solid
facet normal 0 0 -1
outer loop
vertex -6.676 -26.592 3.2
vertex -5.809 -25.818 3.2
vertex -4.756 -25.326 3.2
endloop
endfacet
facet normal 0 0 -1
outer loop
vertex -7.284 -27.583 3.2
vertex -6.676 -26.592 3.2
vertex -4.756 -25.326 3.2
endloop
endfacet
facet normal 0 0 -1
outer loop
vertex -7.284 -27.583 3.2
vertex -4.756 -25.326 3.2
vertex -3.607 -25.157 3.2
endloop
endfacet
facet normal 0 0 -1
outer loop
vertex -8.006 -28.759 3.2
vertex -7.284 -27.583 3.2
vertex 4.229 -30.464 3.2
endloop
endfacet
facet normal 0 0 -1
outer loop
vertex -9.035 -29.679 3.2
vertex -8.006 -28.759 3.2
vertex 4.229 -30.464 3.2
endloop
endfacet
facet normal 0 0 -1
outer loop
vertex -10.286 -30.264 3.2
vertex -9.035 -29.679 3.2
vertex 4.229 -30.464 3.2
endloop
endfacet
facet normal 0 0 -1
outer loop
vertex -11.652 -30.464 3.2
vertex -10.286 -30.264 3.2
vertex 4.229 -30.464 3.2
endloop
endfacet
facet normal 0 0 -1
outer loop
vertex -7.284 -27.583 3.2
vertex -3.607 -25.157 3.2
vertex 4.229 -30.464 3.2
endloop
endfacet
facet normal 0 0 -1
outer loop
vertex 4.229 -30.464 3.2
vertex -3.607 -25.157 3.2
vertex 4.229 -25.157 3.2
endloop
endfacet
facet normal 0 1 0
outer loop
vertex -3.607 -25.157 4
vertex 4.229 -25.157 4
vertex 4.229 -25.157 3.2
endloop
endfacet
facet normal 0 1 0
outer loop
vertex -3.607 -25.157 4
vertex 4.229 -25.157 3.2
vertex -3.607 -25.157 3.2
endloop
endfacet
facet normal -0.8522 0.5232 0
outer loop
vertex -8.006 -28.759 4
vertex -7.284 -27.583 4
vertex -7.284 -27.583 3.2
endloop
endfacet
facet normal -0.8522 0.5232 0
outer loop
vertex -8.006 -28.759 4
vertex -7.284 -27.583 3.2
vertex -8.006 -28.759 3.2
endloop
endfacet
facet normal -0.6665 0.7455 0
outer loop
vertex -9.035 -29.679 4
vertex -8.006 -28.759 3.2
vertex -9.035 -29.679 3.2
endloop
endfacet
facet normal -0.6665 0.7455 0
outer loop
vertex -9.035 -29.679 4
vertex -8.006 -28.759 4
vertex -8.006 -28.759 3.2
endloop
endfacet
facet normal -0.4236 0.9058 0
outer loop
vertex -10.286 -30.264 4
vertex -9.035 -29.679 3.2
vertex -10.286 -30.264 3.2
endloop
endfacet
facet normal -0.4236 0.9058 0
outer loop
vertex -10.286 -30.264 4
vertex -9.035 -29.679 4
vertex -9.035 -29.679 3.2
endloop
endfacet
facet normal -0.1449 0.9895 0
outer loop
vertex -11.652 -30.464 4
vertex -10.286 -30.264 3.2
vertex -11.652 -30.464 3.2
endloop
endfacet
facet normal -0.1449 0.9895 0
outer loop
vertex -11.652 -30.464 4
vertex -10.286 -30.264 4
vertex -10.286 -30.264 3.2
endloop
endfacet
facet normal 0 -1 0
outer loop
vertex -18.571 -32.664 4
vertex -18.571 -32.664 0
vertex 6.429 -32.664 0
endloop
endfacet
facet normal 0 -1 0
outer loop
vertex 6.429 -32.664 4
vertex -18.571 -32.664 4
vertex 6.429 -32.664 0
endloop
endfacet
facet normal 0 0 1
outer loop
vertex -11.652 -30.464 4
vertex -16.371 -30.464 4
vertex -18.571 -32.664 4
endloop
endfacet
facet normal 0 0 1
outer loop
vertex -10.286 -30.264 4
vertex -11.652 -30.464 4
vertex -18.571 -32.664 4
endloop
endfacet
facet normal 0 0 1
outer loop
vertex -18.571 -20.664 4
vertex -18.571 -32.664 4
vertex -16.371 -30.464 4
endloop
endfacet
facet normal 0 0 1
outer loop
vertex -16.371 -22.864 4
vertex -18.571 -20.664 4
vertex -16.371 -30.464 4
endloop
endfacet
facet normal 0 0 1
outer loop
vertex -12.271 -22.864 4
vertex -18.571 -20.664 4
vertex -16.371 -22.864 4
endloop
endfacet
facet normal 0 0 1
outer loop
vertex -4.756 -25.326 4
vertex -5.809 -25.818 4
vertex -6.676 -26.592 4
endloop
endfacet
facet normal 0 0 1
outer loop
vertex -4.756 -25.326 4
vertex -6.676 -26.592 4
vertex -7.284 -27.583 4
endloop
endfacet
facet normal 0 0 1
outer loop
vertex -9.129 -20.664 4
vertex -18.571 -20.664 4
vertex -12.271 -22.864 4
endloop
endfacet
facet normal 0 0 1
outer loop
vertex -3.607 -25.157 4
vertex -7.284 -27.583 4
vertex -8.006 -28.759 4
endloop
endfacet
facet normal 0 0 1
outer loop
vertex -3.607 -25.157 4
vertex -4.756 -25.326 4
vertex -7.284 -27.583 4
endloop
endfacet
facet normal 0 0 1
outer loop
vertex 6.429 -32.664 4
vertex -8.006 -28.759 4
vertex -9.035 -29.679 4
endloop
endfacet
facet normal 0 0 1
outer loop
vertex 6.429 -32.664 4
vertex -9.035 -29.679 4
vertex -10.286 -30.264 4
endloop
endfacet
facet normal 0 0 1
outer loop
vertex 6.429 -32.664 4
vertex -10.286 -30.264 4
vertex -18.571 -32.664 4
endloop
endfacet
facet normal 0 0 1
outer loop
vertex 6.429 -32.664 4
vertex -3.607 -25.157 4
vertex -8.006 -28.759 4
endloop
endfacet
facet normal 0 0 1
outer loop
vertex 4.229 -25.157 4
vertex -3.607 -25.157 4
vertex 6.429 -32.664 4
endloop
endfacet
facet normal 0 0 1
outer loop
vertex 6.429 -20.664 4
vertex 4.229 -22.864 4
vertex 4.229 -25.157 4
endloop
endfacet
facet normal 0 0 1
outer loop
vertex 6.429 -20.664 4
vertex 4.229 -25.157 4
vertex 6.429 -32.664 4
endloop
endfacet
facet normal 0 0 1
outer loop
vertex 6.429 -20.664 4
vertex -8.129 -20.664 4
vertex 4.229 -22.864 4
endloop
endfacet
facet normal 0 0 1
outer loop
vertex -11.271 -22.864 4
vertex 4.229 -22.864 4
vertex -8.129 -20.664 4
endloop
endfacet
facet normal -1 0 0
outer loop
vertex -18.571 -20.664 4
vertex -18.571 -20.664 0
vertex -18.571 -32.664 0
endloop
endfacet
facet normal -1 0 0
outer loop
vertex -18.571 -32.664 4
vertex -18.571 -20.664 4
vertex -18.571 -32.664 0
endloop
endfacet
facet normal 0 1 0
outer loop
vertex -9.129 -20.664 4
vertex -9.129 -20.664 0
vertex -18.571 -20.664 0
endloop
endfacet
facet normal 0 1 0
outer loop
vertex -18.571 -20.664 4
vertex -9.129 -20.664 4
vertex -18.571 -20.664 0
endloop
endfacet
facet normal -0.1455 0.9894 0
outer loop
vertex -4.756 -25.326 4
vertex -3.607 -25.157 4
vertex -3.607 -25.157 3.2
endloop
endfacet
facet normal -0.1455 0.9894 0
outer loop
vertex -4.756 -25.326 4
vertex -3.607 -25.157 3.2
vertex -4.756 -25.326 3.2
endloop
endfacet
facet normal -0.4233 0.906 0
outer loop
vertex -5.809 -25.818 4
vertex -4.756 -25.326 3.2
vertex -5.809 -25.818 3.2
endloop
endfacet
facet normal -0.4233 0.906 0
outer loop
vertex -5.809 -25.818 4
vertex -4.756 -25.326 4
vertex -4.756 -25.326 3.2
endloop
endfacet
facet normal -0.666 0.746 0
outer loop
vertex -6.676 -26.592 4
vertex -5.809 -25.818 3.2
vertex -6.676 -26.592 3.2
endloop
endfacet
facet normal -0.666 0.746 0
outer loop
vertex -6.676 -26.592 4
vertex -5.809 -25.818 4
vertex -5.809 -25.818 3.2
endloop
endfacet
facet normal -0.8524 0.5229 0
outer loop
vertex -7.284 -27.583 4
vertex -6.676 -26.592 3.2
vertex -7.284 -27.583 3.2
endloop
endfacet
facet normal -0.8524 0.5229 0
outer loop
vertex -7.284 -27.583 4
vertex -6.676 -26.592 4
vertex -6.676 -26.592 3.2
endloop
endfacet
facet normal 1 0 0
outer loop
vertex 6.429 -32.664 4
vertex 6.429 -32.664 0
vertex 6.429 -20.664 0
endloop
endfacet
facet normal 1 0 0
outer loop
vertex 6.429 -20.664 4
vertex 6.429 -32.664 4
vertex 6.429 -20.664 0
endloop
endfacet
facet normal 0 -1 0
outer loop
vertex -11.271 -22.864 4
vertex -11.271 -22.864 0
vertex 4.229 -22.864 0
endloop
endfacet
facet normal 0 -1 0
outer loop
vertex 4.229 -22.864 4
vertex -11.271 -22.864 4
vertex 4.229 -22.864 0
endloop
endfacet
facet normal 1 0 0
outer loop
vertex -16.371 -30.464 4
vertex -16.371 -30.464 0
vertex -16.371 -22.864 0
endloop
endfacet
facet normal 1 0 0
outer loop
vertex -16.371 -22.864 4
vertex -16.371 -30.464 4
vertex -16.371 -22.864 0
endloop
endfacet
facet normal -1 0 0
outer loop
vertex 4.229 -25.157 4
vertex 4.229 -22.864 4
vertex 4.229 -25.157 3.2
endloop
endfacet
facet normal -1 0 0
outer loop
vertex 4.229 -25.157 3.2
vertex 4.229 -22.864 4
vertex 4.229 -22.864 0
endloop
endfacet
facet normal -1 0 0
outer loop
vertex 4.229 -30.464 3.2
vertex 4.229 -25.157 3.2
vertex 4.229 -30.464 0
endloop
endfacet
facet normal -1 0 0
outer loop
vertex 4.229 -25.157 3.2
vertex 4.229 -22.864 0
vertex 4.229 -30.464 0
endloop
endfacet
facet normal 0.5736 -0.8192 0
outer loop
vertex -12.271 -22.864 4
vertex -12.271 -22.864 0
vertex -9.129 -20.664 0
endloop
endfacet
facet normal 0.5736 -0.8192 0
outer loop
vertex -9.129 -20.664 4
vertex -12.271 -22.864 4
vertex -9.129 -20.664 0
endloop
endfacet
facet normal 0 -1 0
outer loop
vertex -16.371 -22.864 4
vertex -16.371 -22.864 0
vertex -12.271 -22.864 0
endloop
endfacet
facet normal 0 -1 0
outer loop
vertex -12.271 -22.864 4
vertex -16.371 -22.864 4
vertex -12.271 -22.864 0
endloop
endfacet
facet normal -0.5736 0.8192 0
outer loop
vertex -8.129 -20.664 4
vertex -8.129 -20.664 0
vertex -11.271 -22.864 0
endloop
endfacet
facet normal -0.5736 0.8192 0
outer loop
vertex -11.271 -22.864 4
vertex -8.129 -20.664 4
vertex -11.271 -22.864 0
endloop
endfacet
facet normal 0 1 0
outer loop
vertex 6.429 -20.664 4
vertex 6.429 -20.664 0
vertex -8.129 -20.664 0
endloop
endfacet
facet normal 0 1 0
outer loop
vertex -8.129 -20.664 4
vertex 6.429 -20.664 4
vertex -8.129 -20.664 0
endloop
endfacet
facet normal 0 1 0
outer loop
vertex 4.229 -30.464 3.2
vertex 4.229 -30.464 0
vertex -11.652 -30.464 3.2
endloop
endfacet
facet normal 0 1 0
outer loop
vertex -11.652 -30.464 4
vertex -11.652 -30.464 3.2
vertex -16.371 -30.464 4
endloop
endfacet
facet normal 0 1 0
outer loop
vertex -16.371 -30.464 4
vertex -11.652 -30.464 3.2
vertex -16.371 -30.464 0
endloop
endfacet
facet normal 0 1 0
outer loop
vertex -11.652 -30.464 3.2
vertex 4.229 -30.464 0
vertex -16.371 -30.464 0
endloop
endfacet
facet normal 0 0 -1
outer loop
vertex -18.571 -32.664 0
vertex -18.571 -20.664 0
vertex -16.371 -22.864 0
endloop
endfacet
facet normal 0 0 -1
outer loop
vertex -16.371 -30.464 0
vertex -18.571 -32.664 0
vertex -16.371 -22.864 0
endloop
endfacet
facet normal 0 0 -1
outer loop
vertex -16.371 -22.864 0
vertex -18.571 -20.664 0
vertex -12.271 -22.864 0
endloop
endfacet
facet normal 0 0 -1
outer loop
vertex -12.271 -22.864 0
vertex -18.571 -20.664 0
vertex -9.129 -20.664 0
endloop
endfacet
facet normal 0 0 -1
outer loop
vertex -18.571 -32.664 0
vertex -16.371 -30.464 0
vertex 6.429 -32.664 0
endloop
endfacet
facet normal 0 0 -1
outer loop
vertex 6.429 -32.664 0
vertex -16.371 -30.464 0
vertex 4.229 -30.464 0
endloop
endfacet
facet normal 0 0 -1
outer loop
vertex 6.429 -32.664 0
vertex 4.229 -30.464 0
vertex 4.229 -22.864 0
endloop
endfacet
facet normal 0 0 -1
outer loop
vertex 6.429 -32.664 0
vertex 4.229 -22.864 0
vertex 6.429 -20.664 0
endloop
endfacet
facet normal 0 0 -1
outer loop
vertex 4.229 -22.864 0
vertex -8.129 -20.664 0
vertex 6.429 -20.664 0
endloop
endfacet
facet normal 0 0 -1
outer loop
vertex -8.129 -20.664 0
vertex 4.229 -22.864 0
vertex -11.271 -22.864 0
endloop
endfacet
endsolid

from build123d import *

# Parameters (mm, degrees)
F1_DEPTH = 4
F3_DEPTH = 0.8


with BuildPart() as f1:
    # F0 (on Top) → F1 (new body)
    with BuildSketch(Plane.XY):
        Polygon((-9.1288570138, -20.6640837675), (-18.5707826287, -20.6640837675), (-18.5707826287, -32.6640837675), (6.4292173713, -32.6640837675), (6.4292173713, -20.6640837675), (-8.1288570138, -20.6640837675), (-11.2707826287, -22.8640837675), (4.2292173713, -22.8640837675), (4.2292173713, -30.4640837675), (-16.3707826287, -30.4640837675), (-16.3707826287, -22.8640837675), (-12.2707826287, -22.8640837675), align=None)
    extrude(amount=F1_DEPTH)

    # F2 (on face) → F3 (join)
    with BuildSketch(Plane.XY.offset(4)):
        with BuildLine():
            ThreePointArc((-7.2837039026, -27.5826807615), (-9.0353563223, -29.6788503531), (-11.6517702118, -30.4640837675))
            Line((-11.6517702118, -30.4640837675), (4.2292173713, -30.4640837675))
            Line((4.2292173713, -30.4640837675), (4.2292173713, -25.1570476435))
            Line((4.2292173713, -25.1570476435), (-3.6065624964, -25.1570476435))
            ThreePointArc((-3.6065624964, -25.1570476435), (-5.8091215163, -25.8180756813), (-7.2837039026, -27.5826807615))
        make_face()
    extrude(amount=-F3_DEPTH)


solid = f1.part
